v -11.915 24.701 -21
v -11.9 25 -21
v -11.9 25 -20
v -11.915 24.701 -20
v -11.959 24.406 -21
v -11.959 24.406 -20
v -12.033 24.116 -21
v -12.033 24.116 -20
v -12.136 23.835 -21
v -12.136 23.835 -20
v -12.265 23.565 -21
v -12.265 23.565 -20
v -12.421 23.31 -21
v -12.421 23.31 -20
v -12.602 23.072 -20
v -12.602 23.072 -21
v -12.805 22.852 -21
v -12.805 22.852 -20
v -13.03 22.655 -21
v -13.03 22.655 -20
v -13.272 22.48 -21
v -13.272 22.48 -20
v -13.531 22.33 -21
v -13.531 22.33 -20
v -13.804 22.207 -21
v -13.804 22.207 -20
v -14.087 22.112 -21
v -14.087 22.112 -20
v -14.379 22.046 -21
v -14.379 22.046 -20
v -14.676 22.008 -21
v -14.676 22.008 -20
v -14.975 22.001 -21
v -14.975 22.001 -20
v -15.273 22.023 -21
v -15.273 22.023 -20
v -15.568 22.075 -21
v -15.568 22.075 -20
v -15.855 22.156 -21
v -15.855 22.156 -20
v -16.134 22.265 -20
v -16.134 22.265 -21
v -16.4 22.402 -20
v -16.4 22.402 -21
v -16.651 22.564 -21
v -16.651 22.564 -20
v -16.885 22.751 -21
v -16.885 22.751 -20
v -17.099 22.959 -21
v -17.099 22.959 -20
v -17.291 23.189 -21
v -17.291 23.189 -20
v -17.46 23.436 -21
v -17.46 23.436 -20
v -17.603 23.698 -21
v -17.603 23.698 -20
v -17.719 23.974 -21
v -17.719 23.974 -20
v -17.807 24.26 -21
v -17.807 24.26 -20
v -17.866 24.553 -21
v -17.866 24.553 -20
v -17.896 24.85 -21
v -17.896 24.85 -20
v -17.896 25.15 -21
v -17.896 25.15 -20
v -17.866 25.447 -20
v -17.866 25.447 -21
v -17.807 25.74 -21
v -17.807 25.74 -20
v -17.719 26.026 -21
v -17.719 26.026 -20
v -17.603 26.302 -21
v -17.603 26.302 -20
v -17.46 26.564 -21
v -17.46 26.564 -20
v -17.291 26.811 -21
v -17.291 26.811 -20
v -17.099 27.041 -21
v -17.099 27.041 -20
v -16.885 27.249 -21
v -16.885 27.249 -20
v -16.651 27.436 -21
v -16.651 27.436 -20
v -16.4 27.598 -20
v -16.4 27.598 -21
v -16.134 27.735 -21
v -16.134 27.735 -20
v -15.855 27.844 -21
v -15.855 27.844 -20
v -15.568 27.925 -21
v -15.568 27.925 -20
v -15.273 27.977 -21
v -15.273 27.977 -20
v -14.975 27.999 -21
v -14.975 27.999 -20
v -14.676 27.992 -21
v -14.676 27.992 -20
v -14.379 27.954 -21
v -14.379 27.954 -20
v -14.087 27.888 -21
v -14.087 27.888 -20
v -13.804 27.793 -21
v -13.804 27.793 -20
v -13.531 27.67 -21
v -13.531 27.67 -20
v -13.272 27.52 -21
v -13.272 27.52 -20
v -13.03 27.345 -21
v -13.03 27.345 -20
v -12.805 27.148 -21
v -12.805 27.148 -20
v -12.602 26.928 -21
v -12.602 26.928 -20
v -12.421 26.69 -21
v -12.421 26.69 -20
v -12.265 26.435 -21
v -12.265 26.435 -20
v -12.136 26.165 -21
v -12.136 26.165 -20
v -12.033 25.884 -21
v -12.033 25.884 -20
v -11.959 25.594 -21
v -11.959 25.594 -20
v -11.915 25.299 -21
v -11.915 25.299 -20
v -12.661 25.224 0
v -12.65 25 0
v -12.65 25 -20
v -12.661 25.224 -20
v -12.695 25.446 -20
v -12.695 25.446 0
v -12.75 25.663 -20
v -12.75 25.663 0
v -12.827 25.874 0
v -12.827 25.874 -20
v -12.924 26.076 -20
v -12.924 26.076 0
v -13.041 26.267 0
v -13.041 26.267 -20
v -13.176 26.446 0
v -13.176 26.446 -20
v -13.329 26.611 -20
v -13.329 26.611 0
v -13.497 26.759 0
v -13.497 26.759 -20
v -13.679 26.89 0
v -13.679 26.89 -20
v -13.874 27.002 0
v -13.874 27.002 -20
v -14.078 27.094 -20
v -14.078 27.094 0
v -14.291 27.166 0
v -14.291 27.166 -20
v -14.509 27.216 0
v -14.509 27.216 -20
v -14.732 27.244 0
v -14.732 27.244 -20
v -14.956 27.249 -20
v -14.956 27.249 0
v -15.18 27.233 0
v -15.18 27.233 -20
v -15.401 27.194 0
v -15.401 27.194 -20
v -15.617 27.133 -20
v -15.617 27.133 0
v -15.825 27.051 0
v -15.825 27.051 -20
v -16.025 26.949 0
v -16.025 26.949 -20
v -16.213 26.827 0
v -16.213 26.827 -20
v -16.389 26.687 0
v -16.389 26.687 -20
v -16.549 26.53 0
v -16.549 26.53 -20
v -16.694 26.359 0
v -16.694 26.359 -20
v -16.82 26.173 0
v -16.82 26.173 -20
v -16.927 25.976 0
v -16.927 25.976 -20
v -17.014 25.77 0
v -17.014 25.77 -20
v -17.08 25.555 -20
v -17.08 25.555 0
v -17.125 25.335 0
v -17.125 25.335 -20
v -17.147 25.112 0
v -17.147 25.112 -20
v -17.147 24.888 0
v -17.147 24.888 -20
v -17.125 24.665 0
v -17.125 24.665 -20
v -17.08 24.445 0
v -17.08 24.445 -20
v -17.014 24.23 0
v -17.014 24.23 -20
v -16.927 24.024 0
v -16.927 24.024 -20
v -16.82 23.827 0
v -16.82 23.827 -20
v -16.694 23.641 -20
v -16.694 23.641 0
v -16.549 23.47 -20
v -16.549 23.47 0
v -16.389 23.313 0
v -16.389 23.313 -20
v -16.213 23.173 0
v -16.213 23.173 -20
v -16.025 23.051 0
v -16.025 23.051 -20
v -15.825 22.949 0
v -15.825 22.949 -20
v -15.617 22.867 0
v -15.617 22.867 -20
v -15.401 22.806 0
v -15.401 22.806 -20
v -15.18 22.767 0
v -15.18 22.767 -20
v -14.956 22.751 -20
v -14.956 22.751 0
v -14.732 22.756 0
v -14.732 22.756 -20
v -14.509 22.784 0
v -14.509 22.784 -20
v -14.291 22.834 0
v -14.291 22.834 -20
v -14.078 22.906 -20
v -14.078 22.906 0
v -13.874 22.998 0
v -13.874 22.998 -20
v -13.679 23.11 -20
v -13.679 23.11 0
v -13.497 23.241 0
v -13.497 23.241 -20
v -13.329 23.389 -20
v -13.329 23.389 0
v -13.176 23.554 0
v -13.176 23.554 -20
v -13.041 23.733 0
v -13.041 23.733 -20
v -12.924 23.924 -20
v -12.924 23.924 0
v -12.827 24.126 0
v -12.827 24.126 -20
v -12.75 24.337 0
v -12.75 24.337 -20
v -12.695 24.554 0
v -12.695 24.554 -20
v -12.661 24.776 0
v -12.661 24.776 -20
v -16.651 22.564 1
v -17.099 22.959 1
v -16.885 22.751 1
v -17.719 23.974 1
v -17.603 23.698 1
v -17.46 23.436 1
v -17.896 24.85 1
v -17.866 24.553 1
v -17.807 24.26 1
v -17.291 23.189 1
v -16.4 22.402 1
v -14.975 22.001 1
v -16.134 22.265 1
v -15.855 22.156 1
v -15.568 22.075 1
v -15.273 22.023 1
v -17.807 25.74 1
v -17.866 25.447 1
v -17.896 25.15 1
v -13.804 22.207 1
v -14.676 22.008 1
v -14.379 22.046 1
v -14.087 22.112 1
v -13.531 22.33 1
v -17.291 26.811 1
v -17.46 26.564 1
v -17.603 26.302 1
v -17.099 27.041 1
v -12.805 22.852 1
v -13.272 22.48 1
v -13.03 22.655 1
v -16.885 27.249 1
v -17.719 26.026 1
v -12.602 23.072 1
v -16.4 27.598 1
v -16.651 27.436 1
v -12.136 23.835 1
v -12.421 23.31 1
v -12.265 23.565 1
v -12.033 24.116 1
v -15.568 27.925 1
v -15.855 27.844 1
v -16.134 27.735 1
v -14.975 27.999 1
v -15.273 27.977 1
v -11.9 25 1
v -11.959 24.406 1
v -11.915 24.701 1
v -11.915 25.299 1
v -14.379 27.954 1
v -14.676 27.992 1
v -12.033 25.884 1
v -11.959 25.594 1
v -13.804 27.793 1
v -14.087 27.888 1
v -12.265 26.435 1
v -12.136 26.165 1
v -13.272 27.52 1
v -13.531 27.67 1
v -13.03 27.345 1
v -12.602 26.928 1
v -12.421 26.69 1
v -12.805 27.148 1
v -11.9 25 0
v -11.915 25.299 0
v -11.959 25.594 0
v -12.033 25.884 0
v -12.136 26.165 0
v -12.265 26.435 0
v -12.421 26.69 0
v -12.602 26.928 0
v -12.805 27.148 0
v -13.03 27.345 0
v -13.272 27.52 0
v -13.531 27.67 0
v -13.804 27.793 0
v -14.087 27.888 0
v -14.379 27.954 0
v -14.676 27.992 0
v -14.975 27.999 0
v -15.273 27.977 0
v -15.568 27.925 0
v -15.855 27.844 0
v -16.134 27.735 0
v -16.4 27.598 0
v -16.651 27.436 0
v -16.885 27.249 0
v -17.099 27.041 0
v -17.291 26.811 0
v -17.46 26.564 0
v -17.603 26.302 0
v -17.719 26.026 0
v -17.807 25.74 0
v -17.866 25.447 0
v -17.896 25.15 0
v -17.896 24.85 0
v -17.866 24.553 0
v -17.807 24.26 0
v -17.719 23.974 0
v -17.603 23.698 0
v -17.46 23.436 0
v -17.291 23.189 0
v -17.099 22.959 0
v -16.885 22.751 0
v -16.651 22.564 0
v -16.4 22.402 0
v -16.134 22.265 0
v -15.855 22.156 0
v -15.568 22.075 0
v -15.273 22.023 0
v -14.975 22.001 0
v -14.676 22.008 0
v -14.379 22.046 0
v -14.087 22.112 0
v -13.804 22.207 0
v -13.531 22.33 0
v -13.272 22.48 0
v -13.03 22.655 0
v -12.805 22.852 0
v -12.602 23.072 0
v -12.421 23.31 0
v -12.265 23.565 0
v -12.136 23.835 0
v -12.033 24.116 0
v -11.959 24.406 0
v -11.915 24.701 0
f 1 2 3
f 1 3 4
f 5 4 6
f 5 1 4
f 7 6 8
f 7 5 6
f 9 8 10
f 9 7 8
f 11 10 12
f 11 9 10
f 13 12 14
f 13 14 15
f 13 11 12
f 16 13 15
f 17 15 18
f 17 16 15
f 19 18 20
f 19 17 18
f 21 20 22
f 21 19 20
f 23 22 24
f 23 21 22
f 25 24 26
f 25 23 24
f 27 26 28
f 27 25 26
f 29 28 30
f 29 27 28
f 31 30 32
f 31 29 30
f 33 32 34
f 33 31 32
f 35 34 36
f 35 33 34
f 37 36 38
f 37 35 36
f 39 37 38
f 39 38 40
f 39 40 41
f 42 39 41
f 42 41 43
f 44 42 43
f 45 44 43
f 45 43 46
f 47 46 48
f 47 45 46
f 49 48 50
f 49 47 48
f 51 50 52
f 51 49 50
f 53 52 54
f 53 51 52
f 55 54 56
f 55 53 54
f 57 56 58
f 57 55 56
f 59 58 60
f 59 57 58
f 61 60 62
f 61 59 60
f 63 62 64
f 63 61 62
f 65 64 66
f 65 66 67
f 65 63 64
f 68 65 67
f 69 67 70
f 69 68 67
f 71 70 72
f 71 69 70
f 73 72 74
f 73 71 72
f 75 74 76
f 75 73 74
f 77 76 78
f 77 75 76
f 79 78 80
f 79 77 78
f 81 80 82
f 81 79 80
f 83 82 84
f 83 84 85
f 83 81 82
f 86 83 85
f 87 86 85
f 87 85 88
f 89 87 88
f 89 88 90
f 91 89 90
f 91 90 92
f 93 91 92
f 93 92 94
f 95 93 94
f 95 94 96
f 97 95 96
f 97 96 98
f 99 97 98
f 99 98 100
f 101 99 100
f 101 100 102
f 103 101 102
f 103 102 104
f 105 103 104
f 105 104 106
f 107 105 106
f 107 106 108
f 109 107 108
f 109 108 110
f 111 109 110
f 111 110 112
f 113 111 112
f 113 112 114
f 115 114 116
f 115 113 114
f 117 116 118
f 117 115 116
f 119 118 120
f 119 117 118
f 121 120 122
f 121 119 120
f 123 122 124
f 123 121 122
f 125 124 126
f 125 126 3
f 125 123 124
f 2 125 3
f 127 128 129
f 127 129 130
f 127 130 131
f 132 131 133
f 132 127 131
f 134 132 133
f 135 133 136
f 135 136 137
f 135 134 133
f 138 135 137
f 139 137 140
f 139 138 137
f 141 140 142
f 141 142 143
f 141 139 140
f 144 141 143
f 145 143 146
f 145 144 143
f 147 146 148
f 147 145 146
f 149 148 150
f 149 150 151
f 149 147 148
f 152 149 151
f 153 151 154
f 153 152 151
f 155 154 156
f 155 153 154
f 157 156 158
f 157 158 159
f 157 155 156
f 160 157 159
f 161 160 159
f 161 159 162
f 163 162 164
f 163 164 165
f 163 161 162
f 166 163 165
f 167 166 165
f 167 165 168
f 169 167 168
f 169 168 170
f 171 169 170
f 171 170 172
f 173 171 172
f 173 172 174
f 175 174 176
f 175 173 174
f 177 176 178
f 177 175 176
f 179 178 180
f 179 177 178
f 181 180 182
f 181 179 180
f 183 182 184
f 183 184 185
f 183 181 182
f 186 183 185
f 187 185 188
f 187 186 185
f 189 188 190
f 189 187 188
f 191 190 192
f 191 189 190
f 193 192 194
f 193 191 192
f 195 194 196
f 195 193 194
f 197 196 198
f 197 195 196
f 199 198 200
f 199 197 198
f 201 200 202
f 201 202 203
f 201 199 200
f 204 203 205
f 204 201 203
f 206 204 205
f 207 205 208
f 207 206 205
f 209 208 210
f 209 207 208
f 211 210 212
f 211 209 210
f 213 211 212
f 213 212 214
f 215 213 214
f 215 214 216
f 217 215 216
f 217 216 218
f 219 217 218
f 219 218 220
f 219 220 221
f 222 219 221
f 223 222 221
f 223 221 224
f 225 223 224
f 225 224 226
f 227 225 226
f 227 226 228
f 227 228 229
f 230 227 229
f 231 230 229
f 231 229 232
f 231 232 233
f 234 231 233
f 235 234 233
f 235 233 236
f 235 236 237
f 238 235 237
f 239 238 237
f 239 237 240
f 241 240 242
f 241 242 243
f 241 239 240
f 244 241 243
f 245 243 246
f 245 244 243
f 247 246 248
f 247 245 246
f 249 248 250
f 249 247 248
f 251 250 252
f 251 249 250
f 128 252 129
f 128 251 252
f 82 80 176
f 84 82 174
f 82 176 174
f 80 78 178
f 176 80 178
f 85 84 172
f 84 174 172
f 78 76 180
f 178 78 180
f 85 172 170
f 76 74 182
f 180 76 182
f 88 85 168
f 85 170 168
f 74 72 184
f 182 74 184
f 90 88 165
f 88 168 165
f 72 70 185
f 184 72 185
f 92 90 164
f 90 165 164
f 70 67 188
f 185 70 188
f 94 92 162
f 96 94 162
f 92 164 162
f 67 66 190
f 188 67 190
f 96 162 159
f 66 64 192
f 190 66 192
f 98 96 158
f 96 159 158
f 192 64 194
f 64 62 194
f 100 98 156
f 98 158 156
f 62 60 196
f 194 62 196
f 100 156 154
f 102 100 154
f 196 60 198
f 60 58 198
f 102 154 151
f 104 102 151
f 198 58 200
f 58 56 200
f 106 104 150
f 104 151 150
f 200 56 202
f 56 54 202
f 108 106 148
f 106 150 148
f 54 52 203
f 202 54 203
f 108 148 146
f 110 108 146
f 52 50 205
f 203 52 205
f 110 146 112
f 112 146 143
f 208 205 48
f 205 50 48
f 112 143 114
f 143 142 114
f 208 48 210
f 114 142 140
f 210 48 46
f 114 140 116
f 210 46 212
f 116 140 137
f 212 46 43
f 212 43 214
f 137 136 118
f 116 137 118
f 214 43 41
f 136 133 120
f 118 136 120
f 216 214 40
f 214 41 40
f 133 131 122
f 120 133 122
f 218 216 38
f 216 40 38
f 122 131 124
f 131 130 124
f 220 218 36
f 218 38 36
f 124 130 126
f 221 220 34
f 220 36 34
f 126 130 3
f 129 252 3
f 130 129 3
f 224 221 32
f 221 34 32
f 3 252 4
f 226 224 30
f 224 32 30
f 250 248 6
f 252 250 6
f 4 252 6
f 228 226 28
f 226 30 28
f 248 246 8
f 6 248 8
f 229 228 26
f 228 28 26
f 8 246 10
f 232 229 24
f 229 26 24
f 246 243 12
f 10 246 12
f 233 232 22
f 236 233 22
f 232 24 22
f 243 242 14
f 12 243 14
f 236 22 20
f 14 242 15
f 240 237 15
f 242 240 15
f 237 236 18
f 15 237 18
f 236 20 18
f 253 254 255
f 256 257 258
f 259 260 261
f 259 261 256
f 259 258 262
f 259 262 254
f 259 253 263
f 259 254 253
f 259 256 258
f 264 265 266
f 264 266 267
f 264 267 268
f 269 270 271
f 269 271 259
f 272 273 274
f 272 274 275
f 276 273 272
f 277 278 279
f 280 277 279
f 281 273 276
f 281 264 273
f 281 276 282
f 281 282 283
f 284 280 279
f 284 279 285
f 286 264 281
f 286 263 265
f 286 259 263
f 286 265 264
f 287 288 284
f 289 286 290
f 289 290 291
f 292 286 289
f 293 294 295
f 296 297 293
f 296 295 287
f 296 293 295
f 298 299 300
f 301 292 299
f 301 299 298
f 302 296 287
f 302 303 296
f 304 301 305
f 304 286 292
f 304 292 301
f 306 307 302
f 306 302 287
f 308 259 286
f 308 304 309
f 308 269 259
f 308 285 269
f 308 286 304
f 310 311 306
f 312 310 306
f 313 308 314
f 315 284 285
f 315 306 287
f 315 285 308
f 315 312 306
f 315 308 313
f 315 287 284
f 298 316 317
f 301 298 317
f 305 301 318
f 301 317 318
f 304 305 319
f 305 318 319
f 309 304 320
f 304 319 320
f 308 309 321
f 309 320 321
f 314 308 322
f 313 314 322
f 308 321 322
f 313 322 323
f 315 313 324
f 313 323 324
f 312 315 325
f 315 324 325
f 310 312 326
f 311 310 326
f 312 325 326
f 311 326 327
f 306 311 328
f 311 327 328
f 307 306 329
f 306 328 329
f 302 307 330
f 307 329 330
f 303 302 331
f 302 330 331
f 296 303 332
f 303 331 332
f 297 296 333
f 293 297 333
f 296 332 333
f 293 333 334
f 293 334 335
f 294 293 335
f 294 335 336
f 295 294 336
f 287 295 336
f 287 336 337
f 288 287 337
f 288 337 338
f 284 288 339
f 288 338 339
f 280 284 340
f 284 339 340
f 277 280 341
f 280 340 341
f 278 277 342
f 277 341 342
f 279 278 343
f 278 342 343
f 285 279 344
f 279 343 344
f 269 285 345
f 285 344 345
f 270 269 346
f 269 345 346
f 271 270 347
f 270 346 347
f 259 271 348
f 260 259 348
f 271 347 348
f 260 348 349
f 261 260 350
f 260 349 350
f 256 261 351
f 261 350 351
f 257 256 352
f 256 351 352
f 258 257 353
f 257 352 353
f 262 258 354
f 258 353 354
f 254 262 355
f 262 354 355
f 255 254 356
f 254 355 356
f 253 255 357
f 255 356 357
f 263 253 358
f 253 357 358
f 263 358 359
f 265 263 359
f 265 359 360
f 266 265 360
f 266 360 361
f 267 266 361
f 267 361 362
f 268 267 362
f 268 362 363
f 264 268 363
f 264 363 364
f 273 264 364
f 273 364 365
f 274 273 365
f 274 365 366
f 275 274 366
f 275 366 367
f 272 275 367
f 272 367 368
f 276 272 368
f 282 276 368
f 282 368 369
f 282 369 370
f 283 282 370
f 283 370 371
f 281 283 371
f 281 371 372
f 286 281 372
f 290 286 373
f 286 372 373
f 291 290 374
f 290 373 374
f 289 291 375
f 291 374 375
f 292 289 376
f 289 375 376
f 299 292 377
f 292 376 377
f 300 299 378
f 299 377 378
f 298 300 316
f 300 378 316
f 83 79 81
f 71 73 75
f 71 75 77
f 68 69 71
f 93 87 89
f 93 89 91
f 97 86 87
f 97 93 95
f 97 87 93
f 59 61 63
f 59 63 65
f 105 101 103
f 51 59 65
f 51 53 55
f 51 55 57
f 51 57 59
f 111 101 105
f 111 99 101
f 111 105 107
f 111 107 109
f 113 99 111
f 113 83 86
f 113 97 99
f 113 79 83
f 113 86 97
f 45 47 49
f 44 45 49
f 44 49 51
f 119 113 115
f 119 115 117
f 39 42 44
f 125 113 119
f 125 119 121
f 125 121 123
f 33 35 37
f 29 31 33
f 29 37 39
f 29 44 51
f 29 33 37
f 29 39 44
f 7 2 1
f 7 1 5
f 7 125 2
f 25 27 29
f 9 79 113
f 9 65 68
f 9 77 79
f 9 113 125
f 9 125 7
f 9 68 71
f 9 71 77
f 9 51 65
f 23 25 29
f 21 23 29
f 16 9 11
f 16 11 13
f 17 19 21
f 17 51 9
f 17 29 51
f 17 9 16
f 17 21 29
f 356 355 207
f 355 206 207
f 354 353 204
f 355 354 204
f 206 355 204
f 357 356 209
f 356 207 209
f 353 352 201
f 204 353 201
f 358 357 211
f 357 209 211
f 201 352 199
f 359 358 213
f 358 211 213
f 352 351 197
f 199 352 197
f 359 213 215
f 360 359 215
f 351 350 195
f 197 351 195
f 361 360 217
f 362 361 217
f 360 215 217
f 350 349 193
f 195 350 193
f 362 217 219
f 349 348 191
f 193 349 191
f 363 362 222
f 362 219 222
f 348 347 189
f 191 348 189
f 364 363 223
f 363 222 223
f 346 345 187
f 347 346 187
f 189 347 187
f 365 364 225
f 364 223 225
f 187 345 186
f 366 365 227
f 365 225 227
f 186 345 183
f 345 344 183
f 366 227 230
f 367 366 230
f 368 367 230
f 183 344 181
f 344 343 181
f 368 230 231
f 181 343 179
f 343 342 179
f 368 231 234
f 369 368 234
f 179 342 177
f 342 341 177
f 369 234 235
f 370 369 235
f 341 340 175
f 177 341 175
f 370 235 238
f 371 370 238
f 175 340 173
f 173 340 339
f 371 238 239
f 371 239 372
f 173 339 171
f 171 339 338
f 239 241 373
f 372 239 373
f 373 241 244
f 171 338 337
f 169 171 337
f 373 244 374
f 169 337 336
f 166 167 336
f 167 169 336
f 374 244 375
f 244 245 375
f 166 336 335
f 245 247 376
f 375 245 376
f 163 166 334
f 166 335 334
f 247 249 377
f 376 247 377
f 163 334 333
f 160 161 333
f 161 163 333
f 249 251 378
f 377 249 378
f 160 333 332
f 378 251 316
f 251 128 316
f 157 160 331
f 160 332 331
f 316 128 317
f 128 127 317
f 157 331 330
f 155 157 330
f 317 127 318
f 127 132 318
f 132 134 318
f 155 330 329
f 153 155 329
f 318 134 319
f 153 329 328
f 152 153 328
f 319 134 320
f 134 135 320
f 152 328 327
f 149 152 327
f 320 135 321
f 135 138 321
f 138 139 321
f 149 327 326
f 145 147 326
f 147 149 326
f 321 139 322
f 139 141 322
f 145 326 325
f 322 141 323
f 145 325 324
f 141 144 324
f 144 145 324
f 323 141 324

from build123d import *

# Parameters (mm, degrees)
SKIZZE1_R                       = 2.25
AUFSATZ_LINEAR_AUSTRAGEN1_DEPTH = 20
SKIZZE2_R                       = 3
AUFSATZ_LINEAR_AUSTRAGEN2_DEPTH = 1
AUFSATZ_LINEAR_START            = 1
SKIZZE3_R                       = 3
AUFSATZ_LINEAR_AUSTRAGEN3_DEPTH = 1


with BuildPart() as part:
    # Skizze1 → Aufsatz-Linear austragen1 (new body)
    with BuildSketch(Plane.XY):
        with Locations((-14.9, 25)):
            Circle(SKIZZE1_R)
    extrude(amount=-AUFSATZ_LINEAR_AUSTRAGEN1_DEPTH)

    # Skizze2 → Aufsatz-Linear austragen2 (add)
    with BuildSketch(Plane.XY):
        with Locations((-14.9, 25)):
            Circle(SKIZZE2_R)
    extrude(amount=AUFSATZ_LINEAR_AUSTRAGEN2_DEPTH)

    # Skizze3 → Aufsatz-Linear austragen3 (add)
    with BuildSketch(Plane(origin=(0, 0, -20), x_dir=(-1, 0, 0), z_dir=(0, 0, -1)).offset(AUFSATZ_LINEAR_START)):
        with Locations(Location((14.9, 25, 0), (0, 0, 180))):
            Circle(SKIZZE3_R)
    extrude(amount=-AUFSATZ_LINEAR_AUSTRAGEN3_DEPTH)


solid = part.part
